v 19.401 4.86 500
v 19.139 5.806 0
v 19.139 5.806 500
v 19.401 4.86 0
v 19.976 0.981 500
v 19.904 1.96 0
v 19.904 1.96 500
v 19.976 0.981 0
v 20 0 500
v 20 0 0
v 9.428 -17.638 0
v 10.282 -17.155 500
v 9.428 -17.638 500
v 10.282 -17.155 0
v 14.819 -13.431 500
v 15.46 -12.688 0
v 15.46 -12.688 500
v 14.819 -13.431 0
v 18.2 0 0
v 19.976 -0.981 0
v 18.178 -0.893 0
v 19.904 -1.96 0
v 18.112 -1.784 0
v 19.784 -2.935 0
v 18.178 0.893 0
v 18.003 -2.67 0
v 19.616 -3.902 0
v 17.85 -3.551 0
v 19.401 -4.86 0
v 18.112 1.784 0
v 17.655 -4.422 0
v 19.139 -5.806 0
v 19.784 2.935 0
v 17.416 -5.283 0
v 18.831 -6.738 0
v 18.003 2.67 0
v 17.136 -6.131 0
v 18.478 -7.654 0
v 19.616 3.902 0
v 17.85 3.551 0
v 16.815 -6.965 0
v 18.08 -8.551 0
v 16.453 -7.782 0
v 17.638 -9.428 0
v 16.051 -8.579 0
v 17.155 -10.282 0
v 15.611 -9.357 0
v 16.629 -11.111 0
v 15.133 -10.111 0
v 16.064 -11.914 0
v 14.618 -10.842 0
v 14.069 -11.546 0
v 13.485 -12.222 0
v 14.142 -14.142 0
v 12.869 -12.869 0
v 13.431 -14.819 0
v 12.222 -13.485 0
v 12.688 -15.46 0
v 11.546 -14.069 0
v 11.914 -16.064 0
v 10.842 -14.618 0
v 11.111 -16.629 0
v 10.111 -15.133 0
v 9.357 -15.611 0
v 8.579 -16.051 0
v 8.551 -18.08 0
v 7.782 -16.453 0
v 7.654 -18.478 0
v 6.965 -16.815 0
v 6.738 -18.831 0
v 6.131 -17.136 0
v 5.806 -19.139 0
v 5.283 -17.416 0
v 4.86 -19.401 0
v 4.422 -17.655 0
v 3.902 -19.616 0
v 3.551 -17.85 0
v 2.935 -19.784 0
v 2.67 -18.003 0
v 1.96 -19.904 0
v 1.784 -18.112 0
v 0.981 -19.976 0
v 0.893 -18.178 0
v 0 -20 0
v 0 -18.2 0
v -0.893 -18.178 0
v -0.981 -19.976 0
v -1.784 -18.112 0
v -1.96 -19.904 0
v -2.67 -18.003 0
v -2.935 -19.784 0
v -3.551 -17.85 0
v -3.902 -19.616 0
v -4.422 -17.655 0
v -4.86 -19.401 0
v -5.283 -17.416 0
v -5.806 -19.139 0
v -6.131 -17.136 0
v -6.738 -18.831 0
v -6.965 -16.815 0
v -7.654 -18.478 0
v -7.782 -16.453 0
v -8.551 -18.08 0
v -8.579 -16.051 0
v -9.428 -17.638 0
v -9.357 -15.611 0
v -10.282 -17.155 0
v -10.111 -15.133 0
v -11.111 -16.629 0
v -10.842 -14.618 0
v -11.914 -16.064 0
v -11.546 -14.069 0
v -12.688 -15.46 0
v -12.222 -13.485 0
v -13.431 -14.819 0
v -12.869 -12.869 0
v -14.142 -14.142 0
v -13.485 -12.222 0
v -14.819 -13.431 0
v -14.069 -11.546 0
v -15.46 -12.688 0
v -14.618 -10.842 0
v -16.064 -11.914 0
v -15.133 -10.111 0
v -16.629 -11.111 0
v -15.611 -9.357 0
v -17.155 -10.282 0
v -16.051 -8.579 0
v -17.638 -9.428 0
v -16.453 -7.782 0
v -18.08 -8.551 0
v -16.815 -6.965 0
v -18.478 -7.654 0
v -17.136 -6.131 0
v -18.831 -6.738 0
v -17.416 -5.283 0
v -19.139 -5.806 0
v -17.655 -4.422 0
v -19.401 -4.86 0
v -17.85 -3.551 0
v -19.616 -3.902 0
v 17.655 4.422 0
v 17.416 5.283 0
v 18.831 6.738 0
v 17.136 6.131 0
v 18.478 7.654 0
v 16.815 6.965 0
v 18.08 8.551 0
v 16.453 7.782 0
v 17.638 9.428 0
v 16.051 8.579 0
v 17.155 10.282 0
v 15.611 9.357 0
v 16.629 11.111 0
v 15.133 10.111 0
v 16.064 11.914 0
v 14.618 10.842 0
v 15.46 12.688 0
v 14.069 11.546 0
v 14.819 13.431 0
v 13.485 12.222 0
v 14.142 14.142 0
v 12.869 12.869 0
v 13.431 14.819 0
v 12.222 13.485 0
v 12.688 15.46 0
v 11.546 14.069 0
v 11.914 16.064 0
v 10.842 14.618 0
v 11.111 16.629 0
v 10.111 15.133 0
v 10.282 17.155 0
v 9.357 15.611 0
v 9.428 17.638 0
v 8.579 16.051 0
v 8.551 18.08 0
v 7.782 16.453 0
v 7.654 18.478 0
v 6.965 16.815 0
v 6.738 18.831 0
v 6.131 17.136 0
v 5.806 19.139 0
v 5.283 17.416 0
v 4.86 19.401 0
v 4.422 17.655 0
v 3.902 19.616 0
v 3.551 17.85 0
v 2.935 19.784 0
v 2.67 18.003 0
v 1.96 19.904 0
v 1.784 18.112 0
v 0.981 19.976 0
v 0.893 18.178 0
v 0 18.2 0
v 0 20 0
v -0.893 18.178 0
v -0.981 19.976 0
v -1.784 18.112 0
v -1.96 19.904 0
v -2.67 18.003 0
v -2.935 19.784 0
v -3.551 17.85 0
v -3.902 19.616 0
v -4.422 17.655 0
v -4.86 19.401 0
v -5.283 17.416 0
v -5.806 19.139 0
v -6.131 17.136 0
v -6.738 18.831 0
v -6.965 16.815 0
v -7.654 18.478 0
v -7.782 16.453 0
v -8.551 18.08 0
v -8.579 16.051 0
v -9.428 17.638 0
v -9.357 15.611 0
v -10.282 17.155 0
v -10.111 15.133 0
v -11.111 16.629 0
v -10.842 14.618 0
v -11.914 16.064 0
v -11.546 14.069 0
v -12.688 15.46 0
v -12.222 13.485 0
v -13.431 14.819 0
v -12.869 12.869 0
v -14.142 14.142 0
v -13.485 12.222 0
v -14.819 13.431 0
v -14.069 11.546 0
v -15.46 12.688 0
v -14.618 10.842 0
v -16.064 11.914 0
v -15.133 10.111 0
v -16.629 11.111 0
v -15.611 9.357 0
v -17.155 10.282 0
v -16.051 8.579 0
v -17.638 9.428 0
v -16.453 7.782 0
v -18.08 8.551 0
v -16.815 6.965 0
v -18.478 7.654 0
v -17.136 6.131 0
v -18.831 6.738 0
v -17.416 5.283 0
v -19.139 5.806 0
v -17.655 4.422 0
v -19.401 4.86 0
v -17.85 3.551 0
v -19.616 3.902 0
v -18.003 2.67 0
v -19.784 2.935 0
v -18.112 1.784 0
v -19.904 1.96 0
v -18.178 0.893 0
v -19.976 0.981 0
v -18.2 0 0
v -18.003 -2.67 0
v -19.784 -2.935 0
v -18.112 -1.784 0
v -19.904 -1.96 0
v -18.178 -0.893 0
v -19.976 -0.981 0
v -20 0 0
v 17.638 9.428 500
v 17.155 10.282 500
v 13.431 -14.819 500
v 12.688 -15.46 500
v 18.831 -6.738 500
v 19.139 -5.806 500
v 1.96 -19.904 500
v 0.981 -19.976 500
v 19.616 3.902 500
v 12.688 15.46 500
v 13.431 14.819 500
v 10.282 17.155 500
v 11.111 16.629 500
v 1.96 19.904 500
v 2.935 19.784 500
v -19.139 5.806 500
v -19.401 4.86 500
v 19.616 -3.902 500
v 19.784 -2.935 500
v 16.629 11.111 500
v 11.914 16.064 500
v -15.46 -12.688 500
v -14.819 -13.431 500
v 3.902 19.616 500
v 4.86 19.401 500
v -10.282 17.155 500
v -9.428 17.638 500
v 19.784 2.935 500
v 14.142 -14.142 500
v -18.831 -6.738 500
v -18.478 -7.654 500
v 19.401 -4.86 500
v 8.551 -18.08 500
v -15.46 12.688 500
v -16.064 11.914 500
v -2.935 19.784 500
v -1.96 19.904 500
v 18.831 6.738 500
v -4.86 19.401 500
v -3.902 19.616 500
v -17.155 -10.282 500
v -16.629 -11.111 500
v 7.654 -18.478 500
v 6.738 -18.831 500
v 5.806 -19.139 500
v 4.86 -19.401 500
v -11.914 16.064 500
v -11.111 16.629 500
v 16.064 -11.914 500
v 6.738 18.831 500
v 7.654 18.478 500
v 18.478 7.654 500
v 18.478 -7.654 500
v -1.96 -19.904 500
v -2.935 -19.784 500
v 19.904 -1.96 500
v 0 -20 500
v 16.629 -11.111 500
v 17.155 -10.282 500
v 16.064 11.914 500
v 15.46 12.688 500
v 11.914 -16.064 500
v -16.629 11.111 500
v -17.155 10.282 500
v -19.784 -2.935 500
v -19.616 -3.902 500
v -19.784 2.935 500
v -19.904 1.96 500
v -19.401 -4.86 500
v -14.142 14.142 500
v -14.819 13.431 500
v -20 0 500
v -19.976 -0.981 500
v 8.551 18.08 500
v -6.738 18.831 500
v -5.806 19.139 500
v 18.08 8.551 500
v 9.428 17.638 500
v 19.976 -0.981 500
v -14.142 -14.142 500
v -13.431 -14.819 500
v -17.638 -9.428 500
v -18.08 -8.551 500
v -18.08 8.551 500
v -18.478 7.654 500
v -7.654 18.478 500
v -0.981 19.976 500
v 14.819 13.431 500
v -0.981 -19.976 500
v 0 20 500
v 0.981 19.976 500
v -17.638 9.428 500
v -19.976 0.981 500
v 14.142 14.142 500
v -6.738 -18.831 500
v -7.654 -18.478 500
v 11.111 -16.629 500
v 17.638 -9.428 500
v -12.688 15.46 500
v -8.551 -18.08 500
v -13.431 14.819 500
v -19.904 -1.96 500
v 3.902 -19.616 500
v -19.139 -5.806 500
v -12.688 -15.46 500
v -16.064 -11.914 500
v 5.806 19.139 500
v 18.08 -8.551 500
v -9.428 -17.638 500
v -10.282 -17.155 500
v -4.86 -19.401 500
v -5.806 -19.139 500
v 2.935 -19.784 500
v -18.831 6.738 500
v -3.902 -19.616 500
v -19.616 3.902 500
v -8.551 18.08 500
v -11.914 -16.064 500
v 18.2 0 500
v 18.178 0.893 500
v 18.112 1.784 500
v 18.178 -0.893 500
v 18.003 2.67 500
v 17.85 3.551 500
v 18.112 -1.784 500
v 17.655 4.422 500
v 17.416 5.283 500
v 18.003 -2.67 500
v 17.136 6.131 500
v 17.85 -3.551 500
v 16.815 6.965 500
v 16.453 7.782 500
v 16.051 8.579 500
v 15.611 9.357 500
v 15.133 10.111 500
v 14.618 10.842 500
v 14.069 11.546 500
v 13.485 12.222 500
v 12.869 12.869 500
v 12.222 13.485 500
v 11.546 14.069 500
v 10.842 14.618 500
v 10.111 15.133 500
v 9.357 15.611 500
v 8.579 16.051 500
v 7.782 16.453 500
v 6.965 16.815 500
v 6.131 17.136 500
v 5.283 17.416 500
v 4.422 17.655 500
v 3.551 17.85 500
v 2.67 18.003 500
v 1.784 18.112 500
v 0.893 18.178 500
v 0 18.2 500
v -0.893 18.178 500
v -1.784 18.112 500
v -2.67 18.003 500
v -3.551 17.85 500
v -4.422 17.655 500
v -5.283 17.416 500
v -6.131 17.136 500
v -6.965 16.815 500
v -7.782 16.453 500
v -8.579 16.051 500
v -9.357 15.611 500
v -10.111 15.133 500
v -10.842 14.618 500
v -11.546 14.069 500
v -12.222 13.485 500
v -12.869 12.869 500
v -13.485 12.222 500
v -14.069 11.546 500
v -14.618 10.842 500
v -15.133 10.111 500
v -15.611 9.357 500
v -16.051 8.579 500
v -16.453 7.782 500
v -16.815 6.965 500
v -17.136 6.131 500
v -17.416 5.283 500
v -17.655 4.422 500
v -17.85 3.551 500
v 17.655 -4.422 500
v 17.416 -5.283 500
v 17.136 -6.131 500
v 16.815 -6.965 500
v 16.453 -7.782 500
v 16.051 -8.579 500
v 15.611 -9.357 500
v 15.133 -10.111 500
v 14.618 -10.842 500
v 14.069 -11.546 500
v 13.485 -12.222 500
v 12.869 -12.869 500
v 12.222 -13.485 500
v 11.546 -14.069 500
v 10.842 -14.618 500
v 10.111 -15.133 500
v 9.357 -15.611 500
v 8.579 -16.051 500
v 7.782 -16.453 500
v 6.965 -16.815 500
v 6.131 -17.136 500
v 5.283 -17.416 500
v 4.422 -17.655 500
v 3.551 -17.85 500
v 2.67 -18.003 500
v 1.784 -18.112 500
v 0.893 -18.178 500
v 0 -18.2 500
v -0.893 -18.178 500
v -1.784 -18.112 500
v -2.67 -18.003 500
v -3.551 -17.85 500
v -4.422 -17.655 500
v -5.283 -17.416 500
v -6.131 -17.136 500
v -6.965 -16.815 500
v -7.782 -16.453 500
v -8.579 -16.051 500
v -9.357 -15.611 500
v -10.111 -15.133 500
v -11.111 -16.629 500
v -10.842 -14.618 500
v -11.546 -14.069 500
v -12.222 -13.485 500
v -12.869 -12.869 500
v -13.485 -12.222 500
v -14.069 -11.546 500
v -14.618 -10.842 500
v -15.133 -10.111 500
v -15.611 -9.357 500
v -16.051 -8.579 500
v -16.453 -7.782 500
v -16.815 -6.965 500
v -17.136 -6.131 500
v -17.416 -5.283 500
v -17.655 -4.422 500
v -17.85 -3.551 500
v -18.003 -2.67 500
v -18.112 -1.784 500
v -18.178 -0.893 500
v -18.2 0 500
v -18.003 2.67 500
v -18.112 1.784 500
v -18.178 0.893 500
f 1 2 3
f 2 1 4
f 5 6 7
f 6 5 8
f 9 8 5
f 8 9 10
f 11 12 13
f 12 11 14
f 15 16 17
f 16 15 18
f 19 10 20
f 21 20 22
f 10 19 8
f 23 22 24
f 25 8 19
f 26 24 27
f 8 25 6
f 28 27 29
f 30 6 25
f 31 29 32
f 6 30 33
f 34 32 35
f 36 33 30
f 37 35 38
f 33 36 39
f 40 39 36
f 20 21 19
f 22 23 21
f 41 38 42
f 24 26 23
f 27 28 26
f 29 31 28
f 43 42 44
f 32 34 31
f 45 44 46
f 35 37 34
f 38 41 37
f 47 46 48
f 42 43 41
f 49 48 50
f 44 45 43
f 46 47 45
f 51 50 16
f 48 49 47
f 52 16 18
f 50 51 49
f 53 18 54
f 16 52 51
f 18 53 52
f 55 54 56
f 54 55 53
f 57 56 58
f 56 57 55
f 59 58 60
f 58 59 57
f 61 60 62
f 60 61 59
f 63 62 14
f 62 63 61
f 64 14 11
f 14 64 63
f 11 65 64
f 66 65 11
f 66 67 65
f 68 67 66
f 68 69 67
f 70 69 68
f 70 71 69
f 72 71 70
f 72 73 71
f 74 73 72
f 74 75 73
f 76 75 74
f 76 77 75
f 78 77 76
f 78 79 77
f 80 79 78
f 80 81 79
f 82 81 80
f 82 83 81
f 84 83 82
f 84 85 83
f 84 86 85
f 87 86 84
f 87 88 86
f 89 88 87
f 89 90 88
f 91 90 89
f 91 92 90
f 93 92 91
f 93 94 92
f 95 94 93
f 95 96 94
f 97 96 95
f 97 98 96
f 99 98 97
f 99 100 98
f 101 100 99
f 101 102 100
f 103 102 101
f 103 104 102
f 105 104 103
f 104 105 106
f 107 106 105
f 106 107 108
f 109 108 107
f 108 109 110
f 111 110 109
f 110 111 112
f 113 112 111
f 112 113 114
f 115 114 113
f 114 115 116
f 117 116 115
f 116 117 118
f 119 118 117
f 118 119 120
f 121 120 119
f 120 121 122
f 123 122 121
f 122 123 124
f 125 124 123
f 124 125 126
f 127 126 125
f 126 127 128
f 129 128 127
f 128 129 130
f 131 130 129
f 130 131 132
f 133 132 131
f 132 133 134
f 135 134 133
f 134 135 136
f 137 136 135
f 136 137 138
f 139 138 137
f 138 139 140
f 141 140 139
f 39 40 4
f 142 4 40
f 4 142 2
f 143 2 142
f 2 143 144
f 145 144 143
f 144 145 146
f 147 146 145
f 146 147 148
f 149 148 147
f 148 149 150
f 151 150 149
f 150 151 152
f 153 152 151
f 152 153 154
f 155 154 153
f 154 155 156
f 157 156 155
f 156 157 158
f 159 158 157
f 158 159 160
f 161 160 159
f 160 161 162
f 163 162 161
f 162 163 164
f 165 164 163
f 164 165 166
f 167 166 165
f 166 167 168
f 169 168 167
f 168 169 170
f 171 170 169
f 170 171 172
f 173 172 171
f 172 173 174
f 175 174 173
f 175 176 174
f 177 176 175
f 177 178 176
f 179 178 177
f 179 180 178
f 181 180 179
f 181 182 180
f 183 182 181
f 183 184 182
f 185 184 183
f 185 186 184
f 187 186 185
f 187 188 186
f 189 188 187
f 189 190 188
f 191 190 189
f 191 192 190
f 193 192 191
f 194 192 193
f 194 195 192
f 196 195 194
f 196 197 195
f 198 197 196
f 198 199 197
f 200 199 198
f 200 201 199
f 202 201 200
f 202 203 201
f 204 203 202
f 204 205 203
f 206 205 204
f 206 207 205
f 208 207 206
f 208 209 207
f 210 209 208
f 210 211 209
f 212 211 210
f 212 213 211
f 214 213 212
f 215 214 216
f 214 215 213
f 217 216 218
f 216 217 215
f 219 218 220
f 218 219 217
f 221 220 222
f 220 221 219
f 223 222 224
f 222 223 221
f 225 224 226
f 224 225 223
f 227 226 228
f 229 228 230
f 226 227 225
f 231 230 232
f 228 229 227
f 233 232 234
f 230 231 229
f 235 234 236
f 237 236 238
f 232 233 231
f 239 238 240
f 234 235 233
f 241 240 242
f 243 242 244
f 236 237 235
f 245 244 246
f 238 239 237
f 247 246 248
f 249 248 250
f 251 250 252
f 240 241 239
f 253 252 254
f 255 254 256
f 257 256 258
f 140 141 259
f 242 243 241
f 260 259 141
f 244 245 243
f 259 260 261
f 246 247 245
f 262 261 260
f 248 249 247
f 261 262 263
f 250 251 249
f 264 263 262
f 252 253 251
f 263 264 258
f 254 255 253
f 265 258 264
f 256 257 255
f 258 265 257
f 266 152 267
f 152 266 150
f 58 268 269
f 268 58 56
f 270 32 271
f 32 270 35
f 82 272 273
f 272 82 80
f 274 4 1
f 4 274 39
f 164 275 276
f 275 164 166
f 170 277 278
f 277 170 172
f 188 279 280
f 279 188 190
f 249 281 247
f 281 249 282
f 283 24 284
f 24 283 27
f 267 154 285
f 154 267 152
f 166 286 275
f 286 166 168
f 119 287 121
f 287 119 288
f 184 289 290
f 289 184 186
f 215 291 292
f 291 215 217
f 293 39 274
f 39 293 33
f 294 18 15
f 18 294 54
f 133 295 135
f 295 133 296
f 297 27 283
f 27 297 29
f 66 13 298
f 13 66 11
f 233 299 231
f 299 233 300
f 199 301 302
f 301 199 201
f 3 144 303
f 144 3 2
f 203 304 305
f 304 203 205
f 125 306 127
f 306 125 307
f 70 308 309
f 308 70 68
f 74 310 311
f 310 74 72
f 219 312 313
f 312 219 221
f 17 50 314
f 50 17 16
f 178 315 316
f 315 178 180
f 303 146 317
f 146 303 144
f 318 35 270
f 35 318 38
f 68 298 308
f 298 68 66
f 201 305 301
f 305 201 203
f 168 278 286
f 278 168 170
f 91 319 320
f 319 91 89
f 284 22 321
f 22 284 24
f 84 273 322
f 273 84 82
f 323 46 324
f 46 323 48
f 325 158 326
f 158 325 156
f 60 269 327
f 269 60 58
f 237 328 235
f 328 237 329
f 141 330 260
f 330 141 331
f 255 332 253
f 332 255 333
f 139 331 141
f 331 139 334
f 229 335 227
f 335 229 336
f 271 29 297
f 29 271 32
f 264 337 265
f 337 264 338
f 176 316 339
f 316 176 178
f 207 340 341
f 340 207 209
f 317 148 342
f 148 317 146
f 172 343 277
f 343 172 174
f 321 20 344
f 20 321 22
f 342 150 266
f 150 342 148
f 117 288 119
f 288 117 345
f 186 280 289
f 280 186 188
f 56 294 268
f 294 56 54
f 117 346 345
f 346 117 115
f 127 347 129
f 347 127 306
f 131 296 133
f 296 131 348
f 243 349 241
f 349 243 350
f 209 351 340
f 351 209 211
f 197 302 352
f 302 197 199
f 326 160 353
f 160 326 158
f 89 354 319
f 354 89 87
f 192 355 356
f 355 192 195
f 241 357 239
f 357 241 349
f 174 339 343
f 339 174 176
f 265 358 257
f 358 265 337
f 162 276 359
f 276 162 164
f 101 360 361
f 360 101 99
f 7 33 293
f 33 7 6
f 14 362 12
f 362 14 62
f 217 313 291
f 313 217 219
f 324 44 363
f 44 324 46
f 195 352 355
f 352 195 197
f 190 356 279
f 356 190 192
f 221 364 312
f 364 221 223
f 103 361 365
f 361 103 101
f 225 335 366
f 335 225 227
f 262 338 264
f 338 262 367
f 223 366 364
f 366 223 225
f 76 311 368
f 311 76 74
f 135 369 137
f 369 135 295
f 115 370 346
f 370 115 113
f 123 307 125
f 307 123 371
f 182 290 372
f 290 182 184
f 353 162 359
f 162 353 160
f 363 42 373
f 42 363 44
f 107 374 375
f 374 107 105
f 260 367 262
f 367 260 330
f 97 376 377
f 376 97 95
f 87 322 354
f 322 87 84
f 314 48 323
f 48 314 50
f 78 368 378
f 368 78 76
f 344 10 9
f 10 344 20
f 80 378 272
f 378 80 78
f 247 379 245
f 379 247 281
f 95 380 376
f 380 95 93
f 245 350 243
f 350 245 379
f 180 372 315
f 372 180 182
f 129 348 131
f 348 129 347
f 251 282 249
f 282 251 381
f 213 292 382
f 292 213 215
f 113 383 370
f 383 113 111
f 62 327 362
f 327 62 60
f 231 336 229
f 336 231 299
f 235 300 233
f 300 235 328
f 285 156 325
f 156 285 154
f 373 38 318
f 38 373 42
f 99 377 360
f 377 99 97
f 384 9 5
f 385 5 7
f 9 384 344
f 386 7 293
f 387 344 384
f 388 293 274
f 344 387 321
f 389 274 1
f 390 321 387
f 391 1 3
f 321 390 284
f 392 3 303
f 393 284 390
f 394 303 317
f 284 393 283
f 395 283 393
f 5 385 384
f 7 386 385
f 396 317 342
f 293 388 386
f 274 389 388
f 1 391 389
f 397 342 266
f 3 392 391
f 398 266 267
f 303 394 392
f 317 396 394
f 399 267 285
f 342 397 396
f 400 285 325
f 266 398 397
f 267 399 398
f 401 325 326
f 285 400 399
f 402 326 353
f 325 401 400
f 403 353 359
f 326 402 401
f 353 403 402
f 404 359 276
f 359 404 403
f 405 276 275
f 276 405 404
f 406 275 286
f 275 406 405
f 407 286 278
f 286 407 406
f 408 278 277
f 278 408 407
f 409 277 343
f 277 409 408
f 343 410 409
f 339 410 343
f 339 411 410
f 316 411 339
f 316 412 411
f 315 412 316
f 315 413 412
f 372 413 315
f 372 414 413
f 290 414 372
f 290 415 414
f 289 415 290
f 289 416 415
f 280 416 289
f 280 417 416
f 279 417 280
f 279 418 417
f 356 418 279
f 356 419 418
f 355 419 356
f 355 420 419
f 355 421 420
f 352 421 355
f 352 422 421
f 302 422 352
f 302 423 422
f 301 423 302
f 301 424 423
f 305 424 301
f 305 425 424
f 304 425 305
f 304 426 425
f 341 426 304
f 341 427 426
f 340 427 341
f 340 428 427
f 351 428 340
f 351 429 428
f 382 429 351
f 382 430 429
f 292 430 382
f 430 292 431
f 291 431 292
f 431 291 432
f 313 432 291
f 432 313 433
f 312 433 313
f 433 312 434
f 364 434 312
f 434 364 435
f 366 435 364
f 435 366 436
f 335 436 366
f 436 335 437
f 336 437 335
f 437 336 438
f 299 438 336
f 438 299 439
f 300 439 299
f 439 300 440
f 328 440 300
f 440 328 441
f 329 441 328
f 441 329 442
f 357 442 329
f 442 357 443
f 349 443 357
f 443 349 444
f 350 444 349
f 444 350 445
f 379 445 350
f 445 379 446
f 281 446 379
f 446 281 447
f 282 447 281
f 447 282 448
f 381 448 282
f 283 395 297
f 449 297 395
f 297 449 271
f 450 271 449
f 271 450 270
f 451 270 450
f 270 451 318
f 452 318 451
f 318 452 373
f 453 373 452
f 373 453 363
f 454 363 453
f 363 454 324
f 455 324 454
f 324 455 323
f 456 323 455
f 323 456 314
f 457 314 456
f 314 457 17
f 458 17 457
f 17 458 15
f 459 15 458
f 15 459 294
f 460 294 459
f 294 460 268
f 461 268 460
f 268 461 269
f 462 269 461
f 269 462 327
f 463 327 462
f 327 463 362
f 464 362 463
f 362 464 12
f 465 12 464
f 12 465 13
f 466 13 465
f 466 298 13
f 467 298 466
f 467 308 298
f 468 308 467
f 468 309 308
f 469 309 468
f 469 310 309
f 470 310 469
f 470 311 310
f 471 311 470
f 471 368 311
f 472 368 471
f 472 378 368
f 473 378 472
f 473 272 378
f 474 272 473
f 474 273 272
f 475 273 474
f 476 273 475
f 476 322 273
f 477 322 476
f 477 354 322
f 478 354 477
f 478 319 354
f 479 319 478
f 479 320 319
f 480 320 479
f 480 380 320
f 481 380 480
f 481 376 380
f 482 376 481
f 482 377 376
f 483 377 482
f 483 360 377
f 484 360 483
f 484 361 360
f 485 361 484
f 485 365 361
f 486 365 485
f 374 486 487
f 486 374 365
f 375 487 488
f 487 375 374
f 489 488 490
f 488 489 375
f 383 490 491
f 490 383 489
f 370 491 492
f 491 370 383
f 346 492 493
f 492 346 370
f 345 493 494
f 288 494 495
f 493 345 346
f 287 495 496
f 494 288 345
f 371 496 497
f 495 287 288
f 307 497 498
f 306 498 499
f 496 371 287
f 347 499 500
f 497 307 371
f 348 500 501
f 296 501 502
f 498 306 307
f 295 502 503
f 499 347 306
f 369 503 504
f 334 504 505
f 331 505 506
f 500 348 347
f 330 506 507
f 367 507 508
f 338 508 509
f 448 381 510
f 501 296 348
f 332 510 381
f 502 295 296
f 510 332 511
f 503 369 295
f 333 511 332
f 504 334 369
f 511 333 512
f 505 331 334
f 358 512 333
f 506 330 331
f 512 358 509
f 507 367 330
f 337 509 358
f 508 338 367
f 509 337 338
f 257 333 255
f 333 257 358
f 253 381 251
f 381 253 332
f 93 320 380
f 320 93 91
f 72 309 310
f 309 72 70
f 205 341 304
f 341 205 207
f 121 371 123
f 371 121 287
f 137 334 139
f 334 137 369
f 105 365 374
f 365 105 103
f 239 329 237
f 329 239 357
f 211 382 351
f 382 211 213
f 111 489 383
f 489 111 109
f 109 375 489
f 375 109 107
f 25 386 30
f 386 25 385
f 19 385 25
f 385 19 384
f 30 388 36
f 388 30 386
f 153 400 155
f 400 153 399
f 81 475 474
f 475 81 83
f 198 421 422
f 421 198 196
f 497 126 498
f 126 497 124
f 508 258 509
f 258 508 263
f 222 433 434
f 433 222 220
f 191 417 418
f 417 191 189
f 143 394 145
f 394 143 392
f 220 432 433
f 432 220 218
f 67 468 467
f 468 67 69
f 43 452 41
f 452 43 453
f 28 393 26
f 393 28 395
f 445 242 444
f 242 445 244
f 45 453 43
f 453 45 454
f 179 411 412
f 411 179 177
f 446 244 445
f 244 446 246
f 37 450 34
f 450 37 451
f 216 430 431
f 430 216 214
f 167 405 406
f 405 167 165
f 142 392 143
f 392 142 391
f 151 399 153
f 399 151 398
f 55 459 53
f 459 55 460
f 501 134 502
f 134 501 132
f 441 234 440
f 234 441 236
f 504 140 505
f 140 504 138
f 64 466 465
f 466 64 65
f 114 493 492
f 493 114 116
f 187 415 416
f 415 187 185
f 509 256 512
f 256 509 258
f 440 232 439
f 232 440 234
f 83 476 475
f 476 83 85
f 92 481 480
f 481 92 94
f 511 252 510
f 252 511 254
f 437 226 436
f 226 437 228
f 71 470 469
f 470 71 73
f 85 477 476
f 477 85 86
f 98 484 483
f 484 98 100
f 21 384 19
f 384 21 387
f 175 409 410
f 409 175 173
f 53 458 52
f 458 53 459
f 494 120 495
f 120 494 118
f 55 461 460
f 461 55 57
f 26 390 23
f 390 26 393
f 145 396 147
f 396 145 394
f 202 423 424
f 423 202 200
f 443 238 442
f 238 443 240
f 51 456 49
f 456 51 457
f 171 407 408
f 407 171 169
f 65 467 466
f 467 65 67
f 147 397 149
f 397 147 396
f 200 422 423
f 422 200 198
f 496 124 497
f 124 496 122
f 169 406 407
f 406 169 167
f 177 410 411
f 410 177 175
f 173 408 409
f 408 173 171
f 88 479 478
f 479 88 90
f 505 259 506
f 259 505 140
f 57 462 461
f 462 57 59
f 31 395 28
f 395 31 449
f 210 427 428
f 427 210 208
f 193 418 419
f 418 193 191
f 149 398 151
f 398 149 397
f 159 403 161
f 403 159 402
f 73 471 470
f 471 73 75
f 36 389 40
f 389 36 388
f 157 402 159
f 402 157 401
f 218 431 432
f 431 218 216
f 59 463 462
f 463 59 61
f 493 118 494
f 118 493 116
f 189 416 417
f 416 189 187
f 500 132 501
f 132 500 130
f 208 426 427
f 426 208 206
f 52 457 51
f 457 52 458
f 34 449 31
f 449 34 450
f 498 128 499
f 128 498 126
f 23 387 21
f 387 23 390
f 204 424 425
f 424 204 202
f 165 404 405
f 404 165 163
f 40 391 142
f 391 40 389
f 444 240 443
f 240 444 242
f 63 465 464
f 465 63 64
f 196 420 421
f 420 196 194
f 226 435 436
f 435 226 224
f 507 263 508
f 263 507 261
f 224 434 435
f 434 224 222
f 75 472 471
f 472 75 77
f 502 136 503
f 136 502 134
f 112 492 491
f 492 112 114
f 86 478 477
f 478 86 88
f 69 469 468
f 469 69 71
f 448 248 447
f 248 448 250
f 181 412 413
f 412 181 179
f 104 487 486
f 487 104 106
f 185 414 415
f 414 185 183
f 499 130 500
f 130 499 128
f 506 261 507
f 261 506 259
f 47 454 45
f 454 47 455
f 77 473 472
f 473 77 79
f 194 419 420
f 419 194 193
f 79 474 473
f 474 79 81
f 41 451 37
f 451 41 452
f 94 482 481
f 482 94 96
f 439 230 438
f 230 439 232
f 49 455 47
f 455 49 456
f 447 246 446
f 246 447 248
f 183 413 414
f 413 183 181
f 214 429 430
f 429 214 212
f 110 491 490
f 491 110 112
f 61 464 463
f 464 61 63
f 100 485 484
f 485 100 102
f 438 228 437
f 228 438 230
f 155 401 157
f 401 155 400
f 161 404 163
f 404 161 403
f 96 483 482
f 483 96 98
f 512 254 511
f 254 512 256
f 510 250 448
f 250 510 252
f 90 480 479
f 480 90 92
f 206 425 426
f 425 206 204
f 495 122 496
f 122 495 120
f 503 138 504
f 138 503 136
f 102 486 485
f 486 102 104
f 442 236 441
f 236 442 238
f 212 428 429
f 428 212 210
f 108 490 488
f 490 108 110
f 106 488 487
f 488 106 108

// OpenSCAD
$fn = 128;

// HT pipe (approx.): DN40, length 500 mm
// Typical dimensions used:
// - Outer diameter: 40 mm
// - Wall thickness: 1.8 mm (approx.)
// - Length: 500 mm

length = 500;
od = 40;
wall = 1.8;
id = od - 2*wall;

module ht_pipe(len=500, outer_d=40, inner_d=36.4) {
    difference() {
        cylinder(h=len, d=outer_d, center=false);
        translate([0,0,-0.1])
            cylinder(h=len+0.2, d=inner_d, center=false);
    }
}

ht_pipe(length, od, id);
